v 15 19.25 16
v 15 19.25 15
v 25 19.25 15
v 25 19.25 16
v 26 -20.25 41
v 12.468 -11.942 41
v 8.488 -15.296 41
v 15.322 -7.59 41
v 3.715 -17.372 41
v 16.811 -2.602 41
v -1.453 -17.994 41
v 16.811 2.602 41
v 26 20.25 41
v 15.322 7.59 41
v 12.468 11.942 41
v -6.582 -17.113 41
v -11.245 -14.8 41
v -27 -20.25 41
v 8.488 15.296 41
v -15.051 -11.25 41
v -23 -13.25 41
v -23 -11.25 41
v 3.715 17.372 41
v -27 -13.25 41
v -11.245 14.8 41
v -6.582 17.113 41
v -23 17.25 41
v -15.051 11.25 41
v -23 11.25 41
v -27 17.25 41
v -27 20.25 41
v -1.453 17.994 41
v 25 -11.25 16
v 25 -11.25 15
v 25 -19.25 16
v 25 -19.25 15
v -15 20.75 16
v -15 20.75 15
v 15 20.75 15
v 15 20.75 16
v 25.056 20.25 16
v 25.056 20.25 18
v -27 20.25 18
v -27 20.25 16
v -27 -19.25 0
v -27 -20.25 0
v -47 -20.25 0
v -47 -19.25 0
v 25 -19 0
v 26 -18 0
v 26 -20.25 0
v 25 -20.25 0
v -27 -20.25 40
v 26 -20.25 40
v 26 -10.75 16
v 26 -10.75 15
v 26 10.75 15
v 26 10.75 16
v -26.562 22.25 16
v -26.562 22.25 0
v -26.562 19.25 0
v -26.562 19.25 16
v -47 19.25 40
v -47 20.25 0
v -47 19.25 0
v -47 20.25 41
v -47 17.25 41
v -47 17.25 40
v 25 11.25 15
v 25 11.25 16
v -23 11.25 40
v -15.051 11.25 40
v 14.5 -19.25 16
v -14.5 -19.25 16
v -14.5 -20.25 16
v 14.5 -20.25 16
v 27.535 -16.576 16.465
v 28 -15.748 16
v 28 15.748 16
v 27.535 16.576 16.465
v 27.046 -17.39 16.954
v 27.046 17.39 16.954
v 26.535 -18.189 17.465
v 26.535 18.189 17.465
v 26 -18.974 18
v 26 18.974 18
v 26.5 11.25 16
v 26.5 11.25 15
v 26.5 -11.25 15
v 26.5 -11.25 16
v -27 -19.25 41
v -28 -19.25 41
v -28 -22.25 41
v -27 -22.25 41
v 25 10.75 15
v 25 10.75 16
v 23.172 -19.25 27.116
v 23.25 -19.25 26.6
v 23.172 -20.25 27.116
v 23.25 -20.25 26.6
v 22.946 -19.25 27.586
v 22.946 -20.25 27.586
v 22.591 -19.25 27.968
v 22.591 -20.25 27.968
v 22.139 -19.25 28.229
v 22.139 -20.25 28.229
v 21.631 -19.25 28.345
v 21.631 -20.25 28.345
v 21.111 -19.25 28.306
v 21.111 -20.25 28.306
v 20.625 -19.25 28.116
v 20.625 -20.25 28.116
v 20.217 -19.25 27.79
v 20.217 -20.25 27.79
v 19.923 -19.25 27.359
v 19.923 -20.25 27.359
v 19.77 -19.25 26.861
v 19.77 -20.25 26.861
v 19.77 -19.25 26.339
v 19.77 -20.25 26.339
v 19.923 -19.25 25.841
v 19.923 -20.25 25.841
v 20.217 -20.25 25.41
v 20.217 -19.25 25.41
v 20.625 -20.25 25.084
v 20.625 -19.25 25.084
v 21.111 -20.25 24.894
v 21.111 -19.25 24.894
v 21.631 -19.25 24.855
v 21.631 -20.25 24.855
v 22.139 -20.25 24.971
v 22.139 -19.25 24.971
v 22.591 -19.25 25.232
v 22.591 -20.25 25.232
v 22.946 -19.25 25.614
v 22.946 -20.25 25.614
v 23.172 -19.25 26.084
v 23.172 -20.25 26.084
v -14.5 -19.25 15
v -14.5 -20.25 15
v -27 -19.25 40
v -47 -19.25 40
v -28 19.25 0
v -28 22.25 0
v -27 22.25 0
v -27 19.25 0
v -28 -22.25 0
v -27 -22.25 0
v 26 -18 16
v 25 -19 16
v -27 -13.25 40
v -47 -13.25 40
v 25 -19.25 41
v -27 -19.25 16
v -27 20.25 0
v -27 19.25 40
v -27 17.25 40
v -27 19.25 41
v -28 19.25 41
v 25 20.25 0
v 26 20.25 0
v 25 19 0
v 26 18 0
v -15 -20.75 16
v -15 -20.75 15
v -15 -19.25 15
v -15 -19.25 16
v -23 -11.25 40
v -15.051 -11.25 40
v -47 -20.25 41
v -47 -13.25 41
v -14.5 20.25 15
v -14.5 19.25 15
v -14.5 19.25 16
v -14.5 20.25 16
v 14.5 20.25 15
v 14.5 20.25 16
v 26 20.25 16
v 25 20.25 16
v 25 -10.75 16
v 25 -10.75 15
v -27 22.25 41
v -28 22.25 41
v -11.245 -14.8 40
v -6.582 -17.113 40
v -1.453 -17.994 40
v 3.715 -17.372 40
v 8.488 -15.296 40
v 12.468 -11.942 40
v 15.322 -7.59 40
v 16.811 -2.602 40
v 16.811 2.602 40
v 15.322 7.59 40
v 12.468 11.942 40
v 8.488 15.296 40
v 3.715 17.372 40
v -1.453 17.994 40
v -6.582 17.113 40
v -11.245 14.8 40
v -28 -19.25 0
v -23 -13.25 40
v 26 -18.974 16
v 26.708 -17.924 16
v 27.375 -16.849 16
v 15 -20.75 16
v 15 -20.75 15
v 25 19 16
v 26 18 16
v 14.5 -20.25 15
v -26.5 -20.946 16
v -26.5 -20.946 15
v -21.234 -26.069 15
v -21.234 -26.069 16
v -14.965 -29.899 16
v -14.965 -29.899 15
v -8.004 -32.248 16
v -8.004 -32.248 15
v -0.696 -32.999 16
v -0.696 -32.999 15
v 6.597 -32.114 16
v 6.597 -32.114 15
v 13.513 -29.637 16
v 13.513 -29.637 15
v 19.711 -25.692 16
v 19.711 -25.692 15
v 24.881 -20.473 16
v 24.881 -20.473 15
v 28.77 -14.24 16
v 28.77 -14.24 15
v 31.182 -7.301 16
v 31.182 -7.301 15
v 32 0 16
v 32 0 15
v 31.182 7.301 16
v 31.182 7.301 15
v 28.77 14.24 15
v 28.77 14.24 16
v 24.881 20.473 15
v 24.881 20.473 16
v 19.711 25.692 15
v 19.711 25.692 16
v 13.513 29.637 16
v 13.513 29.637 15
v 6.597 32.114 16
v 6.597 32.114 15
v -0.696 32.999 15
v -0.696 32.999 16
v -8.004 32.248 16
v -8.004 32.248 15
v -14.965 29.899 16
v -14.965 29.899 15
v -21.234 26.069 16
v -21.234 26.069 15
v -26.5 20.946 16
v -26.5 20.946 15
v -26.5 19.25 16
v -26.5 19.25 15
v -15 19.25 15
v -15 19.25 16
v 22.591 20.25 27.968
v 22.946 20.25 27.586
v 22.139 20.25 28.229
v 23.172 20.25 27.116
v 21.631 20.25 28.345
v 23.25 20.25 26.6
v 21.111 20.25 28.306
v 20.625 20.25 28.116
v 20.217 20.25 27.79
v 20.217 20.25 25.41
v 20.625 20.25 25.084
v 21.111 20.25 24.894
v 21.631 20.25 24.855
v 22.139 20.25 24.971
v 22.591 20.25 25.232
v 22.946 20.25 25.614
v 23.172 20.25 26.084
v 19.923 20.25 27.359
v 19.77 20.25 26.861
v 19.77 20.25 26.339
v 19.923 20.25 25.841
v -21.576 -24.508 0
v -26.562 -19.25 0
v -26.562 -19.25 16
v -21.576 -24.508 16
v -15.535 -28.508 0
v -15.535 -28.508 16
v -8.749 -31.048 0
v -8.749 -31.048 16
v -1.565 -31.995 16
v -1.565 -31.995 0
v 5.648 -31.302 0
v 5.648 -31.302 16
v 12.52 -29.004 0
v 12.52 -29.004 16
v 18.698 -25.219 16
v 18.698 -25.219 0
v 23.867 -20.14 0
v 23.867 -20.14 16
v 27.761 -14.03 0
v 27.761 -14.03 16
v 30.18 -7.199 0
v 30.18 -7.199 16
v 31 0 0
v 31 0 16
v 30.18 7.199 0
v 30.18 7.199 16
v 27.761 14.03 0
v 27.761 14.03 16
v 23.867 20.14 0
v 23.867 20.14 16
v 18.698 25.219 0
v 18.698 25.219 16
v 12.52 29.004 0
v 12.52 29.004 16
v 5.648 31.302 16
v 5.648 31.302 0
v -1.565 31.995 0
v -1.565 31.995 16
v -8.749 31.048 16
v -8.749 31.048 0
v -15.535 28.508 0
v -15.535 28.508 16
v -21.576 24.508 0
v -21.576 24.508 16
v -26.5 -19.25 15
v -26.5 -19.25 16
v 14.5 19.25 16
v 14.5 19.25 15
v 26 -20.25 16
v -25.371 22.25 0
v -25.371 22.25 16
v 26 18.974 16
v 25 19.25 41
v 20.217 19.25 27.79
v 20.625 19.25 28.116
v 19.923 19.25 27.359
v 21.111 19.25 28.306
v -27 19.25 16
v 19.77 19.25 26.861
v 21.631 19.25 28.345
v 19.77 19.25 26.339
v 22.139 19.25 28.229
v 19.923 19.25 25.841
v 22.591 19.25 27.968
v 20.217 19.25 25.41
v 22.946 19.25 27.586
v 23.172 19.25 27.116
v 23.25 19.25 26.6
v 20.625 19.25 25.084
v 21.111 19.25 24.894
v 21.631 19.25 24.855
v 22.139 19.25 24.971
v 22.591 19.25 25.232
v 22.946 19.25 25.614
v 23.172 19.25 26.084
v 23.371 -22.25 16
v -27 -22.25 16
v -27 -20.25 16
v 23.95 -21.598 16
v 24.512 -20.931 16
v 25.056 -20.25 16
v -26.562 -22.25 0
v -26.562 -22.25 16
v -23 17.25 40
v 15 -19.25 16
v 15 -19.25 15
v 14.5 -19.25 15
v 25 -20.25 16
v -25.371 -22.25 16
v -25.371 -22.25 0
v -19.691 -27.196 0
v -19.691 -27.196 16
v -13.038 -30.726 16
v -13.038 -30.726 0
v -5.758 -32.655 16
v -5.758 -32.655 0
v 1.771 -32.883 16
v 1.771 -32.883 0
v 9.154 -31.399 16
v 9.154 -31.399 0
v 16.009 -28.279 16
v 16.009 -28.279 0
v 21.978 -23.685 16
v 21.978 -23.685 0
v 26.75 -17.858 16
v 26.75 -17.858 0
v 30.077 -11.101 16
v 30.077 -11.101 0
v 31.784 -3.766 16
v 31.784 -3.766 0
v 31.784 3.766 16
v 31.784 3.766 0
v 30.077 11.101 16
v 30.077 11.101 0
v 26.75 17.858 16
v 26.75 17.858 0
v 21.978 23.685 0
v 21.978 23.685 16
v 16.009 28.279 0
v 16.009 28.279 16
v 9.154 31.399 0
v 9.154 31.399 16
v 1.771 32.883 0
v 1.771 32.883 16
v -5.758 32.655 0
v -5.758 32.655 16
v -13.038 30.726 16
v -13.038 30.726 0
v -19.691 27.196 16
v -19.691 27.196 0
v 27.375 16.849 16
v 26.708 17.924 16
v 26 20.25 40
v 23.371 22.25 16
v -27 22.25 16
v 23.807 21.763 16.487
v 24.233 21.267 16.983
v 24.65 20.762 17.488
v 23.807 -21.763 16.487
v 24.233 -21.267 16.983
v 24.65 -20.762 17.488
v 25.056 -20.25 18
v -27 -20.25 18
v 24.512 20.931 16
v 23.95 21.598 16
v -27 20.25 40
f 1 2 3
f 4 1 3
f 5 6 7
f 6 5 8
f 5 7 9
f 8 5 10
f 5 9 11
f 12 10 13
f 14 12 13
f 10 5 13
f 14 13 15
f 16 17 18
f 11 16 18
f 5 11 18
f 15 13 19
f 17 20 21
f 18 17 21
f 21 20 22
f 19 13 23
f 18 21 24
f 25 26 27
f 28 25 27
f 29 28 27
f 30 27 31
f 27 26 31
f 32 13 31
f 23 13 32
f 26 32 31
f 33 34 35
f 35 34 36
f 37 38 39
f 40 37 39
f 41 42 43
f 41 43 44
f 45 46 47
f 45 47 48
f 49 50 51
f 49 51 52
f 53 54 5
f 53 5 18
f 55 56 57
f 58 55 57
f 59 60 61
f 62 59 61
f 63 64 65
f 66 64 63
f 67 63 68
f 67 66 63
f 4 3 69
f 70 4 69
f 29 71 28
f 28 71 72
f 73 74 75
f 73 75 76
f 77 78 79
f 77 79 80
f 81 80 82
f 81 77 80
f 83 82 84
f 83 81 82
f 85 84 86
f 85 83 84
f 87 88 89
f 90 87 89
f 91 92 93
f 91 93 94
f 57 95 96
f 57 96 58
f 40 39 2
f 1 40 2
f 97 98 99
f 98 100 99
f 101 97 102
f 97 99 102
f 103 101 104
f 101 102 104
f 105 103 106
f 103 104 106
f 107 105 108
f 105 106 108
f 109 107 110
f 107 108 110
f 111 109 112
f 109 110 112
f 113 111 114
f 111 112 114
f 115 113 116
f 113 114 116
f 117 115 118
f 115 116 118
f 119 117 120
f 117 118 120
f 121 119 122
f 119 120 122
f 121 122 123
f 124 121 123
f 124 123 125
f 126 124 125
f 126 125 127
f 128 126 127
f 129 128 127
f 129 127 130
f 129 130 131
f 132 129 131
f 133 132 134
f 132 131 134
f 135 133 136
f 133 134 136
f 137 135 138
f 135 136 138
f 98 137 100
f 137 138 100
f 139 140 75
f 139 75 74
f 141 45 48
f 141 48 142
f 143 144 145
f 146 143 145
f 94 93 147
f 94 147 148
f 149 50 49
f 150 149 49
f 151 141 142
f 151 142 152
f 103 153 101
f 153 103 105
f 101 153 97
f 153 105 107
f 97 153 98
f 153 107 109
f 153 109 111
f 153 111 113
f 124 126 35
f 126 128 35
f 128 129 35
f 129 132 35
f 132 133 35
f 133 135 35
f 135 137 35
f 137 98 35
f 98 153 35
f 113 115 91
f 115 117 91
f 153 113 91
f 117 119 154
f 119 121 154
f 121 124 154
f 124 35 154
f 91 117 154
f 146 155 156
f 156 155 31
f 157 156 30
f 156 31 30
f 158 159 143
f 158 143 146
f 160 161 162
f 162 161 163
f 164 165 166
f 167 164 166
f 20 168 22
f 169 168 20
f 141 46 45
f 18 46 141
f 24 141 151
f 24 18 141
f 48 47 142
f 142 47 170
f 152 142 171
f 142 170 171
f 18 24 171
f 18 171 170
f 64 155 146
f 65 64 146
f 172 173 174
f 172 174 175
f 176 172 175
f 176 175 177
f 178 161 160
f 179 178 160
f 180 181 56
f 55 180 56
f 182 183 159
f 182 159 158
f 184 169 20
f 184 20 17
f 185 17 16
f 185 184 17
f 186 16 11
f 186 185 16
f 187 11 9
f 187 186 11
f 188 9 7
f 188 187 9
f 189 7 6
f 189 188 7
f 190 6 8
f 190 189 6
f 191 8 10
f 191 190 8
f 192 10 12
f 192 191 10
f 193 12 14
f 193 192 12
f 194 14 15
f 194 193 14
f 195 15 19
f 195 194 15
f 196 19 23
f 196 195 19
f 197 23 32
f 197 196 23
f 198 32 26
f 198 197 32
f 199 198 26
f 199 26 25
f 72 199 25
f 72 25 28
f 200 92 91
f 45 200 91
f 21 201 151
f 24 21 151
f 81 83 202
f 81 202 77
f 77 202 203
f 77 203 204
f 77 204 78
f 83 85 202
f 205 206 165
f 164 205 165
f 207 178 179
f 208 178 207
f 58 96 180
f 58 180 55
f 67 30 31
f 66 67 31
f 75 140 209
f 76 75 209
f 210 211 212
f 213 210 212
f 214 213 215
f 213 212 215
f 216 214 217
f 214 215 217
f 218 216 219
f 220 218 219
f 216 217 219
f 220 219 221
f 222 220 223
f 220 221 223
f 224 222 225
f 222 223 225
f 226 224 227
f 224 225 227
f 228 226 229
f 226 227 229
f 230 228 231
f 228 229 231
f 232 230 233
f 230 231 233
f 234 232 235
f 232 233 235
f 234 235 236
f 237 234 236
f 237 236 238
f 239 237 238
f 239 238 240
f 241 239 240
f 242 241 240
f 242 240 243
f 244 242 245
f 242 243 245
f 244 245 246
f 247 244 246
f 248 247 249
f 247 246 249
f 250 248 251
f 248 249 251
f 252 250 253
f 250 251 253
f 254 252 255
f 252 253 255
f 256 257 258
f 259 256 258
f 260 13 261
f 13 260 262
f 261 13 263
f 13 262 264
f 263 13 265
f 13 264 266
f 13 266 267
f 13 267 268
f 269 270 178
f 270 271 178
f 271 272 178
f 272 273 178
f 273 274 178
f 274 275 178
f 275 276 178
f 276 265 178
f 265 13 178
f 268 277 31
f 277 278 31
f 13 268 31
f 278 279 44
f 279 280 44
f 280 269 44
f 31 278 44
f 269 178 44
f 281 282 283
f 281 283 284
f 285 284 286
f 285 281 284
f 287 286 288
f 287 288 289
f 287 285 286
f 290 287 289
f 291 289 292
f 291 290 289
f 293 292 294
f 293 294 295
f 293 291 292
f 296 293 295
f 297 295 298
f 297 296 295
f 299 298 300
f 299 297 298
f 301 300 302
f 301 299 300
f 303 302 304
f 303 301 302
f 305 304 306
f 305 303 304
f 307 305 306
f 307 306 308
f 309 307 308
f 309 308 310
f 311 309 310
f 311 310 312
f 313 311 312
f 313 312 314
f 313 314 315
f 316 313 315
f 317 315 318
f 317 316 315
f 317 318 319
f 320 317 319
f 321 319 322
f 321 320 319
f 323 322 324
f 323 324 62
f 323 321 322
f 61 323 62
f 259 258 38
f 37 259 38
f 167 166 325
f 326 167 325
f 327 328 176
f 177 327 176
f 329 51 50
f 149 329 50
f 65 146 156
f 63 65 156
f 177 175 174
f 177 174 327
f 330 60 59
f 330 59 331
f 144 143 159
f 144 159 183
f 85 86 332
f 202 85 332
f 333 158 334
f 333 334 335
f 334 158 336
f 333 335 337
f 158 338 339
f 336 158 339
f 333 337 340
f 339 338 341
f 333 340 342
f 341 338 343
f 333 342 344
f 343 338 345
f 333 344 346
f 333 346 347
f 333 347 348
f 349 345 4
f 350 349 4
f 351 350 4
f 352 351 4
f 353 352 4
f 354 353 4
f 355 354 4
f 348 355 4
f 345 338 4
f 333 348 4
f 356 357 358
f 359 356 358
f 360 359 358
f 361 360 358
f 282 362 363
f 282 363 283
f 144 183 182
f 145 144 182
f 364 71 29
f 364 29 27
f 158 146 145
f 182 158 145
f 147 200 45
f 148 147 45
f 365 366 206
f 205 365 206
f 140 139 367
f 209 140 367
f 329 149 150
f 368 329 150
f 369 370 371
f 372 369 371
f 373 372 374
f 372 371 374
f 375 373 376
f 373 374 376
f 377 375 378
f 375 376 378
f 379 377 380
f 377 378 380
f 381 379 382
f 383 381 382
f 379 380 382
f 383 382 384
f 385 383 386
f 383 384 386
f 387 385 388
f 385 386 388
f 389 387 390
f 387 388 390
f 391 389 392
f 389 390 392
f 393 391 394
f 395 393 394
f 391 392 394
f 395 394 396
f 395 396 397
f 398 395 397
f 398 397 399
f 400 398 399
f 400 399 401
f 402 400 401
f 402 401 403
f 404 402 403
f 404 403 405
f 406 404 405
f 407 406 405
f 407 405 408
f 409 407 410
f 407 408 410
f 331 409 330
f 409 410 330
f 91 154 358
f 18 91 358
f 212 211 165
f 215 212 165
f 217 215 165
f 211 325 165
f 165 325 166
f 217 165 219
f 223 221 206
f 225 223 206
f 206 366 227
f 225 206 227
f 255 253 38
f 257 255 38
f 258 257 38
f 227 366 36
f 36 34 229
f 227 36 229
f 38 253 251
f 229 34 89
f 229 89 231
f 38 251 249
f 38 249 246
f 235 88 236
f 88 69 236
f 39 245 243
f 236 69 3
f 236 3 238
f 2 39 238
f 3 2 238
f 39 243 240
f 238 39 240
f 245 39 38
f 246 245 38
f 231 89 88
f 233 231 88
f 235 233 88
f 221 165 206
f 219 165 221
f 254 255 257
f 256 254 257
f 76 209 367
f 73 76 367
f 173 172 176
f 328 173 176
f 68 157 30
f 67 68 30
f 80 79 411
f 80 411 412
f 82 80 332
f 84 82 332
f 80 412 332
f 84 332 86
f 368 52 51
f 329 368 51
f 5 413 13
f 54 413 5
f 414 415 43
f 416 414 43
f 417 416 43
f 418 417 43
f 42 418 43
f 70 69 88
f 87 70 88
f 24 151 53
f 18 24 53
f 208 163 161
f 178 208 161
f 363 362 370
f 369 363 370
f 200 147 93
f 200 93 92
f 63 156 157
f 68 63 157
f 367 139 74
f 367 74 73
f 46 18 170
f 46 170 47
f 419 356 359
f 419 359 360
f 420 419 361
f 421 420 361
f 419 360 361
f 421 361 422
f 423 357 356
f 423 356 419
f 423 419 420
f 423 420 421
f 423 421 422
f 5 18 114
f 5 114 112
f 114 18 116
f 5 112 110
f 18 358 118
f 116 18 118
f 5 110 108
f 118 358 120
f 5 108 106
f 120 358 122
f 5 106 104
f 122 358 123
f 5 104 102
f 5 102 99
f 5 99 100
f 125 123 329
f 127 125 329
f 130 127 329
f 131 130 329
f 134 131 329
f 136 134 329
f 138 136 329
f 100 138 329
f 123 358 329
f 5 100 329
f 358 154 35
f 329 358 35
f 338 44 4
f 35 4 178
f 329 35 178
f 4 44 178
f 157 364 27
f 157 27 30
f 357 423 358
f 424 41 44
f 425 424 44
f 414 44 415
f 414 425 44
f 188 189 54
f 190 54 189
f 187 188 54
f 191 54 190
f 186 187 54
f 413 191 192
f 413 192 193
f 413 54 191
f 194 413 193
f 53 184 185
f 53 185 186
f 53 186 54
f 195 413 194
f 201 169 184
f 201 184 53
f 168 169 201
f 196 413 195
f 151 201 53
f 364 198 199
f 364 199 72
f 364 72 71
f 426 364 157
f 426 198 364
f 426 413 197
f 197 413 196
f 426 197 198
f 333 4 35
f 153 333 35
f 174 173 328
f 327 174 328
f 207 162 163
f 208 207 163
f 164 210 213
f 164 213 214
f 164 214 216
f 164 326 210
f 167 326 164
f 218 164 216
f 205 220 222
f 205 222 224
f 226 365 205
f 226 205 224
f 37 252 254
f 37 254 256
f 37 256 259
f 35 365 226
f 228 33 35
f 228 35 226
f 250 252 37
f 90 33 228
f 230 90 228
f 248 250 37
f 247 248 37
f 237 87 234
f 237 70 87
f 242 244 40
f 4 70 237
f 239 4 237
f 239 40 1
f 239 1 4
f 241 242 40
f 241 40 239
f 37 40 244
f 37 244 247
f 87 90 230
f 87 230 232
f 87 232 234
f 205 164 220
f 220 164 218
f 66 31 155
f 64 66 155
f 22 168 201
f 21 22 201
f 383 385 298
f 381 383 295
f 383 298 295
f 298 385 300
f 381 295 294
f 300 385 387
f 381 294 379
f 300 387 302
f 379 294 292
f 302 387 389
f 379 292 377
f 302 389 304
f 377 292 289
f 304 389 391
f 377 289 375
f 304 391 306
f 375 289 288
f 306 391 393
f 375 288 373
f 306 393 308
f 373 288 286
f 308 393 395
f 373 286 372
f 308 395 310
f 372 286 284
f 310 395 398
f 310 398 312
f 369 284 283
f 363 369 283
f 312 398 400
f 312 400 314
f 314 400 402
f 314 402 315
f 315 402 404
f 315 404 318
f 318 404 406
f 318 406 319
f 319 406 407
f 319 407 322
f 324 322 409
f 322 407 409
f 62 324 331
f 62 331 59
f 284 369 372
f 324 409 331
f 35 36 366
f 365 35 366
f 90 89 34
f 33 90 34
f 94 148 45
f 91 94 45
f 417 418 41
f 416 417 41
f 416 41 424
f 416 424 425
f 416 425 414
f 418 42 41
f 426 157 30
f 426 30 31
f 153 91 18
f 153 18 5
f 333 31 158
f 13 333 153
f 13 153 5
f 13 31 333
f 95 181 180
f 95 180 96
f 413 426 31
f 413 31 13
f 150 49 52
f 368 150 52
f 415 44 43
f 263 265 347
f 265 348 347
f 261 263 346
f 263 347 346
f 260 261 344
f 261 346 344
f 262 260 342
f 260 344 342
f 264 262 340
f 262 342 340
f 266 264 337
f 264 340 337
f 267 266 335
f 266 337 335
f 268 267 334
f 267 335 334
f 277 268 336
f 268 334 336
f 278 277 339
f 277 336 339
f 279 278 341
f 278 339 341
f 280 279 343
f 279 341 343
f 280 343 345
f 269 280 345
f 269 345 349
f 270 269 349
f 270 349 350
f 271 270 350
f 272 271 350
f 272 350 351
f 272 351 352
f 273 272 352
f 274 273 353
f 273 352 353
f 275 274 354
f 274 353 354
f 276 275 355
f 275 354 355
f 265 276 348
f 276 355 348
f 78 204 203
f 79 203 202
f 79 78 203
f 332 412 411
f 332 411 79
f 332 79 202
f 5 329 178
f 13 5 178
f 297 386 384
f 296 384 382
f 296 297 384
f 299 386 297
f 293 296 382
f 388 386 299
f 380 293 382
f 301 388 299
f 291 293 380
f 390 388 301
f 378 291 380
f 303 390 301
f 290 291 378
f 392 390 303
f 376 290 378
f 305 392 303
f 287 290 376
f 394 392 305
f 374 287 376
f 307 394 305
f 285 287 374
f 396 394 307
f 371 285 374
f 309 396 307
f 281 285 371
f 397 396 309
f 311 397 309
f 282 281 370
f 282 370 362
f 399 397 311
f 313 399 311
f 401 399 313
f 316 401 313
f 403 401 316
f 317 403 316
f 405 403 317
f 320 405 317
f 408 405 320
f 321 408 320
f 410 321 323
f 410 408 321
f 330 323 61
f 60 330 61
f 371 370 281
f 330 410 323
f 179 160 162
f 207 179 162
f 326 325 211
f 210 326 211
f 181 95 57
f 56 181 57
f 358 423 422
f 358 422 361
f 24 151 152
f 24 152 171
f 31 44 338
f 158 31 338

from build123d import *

# Parameters (mm, degrees)
EXTRUDE_DEPTH    = 16
EXTRUDE001_DEPTH = 1
EXTRUDE004_DEPTH = 1
SKETCH003_R      = 1.75
EXTRUDE003_DEPTH = 25
EXTRUDE002_DEPTH = 25
EXTRUDE005_DEPTH = 5
SKETCH008_W      = 29
SKETCH008_H      = 1
SKETCH008_W_2    = 1
SKETCH008_H_2    = 21.5
EXTRUDE006_DEPTH = 1
EXTRUDE007_DEPTH = 16
EXTRUDE008_DEPTH = 20
SKETCH011_W      = 1
SKETCH011_H      = 3
EXTRUDE009_DEPTH = 41


with BuildPart() as extrude_body:
    # Sketch → Extrude (new body)
    with BuildSketch(Plane.XY):
        with BuildLine():
            ThreePointArc((-26.562424, -19.25), (31, 0), (-26.562424, 19.25))
            Line((-26.562424, 22.25), (-26.562424, 19.25))
            Line((-26.562424, 22.25), (-25.370833, 22.25))
            ThreePointArc((-25.370833, -22.25), (32, 0), (-25.370833, 22.25))
            Line((-26.562424, -22.25), (-25.370833, -22.25))
            Line((-26.562424, -22.25), (-26.562424, -19.25))
        make_face()
    extrude(amount=EXTRUDE_DEPTH)


with BuildPart() as extrude001:
    # Sketch001 → Extrude001 (new body)
    with BuildSketch(Plane.XY.offset(15)):
        with BuildLine():
            ThreePointArc((-26.5, -20.94636), (32, 0), (-26.5, 20.94636))
            Line((-26.5, 20.94636), (-26.5, 19.25))
            Line((-26.5, 19.25), (-15, 19.25))
            Line((-15, 19.25), (-15, 20.75))
            Line((-15, 20.75), (15, 20.75))
            Line((15, 20.75), (15, 19.25))
            Line((15, 19.25), (25, 19.25))
            Line((25, 19.25), (25, 11.25))
            Line((25, 11.25), (26.5, 11.25))
            Line((26.5, 11.25), (26.5, -11.25))
            Line((26.5, -11.25), (25, -11.25))
            Line((25, -11.25), (25, -19.25))
            Line((25, -19.25), (15, -19.25))
            Line((15, -19.25), (15, -20.75))
            Line((15, -20.75), (-15, -20.75))
            Line((-15, -20.75), (-15, -19.25))
            Line((-15, -19.25), (-26.5, -19.25))
            Line((-26.5, -19.25), (-26.5, -20.94636))
        make_face()
    extrude(amount=EXTRUDE001_DEPTH)


with BuildPart() as extrude004:
    # Sketch004 → Extrude004 (new body)
    with BuildSketch(Plane.XY.offset(40)):
        with BuildLine():
            Line((-27, 20.25), (26, 20.25))
            Line((26, 20.25), (26, -20.25))
            Line((26, -20.25), (-27, -20.25))
            Line((-27, -13.25), (-27, -20.25))
            Line((-23, -13.25), (-27, -13.25))
            Line((-23, -11.25), (-23, -13.25))
            Line((-23, -11.25), (-15.051245, -11.25))
            ThreePointArc((-15.051245, -11.25), (17, 0), (-15.051245, 11.25))
            Line((-23, 11.25), (-15.051245, 11.25))
            Line((-23, 11.25), (-23, 17.25))
            Line((-23, 17.25), (-27, 17.25))
            Line((-27, 17.25), (-27, 20.25))
        make_face()
    extrude(amount=EXTRUDE004_DEPTH)


with BuildPart() as extrude003:
    # Sketch003 → Extrude003 (new body, symmetric)
    with BuildSketch(Plane.XZ):
        with Locations((21.5, 26.6)):
            Circle(SKETCH003_R)
    extrude(amount=EXTRUDE003_DEPTH, both=True)


with BuildPart() as cut:
    # Sketch002 → Extrude002 (new body)
    with BuildSketch(Plane.XY.offset(16)):
        Polygon((-27, 19.25), (25, 19.25), (25, -19.25), (-27, -19.25), (-27, -20.25), (26, -20.25), (26, 20.25), (-27, 20.25), align=None)
    extrude(amount=EXTRUDE002_DEPTH)

    # Cut: cut Extrude003
    add(extrude003.part, mode=Mode.SUBTRACT)


with BuildPart() as sweep_body:
    # Sweep: sweep along a path in Sketch006
    with BuildLine(Plane.XY.offset(16)) as sweep_path:
        Line((-27, 20.25), (26, 20.25))
        Line((26, 20.25), (26, -20.25))
        Line((26, -20.25), (-27, -20.25))
    # Sketch005 → Sweep (sweep)
    with BuildSketch(Plane.XZ):
        Polygon((26, 18), (28, 16), (26, 16), align=None)
    sweep(path=sweep_path.line, transition=Transition.RIGHT)


with BuildPart() as common:
    # Sketch007 → Extrude005 (new body)
    with BuildSketch(Plane.XY.offset(15)):
        with BuildLine():
            ThreePointArc((0, -32.984845), (32, 0), (0, 32.984845))
            Line((0, 32.984845), (-28, 32.984845))
            Line((-28, 32.984845), (-28, -32.984845))
            Line((-28, -32.984845), (0, -32.984845))
        make_face()
    extrude(amount=EXTRUDE005_DEPTH)

    # Common: intersect Sweep body
    add(sweep_body.part, mode=Mode.INTERSECT)


with BuildPart() as extrude006:
    # Sketch008 → Extrude006 (new body)
    with BuildSketch(Plane.XY.offset(15)):
        with Locations((0, 19.75)):
            Rectangle(SKETCH008_W, SKETCH008_H)
        with Locations((25.5, 0)):
            Rectangle(SKETCH008_W_2, SKETCH008_H_2)
        with Locations((0, -19.75)):
            Rectangle(SKETCH008_W, SKETCH008_H)
    extrude(amount=EXTRUDE006_DEPTH)


with BuildPart() as extrude007:
    # Sketch009 → Extrude007 (new body)
    with BuildSketch(Plane(origin=(0, 0, 0), x_dir=(1, 0, 0), z_dir=(0, 0, -1))):
        Polygon((25, 20.25), (26, 20.25), (26, 18), (25, 19), align=None)
        Polygon((25, -19), (26, -18), (26, -20.25), (25, -20.25), align=None)
    extrude(amount=-EXTRUDE007_DEPTH)


with BuildPart() as extrude008:
    # Sketch010 → Extrude008 (new body)
    with BuildSketch(Plane(origin=(-27, 0, 0), x_dir=(0, -1, 0), z_dir=(-1, 0, 0))):
        Polygon((-19.25, 0), (-19.25, 40), (-17.25, 40), (-17.25, 41), (-20.25, 41), (-20.25, 0), align=None)
        Polygon((19.25, 0), (19.25, 40), (13.25, 40), (13.25, 41), (20.25, 41), (20.25, 0), align=None)
    extrude(amount=EXTRUDE008_DEPTH)


with BuildPart() as extrude009:
    # Sketch011 → Extrude009 (new body)
    with BuildSketch(Plane.XY):
        with Locations((-27.5, 20.75)):
            Rectangle(SKETCH011_W, SKETCH011_H)
        with Locations((-27.5, -20.75)):
            Rectangle(SKETCH011_W, SKETCH011_H)
    extrude(amount=EXTRUDE009_DEPTH)


solid = Compound([extrude_body.part, extrude001.part, extrude004.part, cut.part, common.part, extrude006.part, extrude007.part, extrude008.part, extrude009.part])
